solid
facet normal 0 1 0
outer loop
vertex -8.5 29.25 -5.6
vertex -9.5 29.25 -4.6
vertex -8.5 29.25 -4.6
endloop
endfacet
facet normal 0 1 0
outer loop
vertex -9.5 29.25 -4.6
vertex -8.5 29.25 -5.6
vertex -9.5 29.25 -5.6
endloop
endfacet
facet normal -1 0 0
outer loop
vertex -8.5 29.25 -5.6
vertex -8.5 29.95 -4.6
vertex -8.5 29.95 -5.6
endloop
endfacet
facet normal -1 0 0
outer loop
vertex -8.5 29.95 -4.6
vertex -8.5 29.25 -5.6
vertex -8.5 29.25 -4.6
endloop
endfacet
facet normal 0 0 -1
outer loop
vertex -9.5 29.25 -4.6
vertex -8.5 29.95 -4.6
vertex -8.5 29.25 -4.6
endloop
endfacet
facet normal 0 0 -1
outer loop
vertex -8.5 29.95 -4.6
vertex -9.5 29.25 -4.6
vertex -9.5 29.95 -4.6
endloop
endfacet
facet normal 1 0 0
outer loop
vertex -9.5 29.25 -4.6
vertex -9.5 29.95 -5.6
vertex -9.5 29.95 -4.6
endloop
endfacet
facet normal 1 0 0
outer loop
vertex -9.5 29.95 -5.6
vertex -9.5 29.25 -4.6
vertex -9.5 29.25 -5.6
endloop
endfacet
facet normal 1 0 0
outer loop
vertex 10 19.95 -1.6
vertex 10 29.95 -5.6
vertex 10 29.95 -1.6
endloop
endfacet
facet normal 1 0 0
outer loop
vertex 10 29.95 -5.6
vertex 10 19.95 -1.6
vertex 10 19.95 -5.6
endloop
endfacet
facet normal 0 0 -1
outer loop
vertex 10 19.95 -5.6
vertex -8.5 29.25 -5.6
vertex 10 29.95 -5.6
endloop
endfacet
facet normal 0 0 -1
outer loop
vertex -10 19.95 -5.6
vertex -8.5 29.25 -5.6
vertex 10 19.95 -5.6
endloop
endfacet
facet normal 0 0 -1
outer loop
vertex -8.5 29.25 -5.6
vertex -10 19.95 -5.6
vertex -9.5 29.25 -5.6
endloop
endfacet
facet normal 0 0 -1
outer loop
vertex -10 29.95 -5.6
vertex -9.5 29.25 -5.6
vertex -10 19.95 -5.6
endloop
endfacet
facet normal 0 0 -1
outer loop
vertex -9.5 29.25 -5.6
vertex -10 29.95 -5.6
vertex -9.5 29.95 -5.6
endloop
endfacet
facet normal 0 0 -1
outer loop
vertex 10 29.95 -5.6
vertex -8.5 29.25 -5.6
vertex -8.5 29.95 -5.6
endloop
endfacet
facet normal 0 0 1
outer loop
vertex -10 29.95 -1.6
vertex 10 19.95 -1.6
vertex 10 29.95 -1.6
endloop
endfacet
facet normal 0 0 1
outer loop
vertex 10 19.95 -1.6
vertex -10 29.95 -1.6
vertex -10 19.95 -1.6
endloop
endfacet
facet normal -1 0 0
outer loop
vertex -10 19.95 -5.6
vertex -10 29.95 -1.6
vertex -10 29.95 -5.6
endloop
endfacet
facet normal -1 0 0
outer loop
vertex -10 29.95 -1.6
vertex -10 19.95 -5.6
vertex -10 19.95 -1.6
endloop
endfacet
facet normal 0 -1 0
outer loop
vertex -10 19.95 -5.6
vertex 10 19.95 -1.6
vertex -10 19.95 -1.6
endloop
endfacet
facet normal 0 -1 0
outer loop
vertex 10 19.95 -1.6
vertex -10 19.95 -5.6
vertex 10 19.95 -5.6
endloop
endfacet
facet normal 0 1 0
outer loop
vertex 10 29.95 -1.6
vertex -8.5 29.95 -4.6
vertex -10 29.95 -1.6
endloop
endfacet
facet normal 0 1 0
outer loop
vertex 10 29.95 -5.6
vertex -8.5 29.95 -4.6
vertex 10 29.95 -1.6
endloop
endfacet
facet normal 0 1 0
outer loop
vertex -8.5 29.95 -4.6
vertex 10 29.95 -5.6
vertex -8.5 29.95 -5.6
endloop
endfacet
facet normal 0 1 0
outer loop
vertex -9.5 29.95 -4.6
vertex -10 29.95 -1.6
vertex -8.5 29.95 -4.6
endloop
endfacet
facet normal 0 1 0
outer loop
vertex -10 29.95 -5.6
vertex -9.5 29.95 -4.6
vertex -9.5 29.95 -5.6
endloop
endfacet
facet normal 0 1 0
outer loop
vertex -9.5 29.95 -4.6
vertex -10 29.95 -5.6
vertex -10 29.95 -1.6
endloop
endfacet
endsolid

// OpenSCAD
    // MixTape 3d Printed Case///////////////////////////

plugHeight = 9.8; // [6:10]
tapeHeight = 10.0; //
topThickness = 1.6; 

usb_charger = false;
cutout_aux_ports = true;

rotate([180,0,$t*380]) translate([-50,-30,0]){

//PCB();
//parts();

difference(){
    
    FullCase();
    
    // Plugs 
    translate([2.5,50,tapeHeight-plugHeight+topThickness]) cube([13,20,plugHeight+1],false); 
    translate([83.5,50,tapeHeight-plugHeight+topThickness]) cube([13,20,plugHeight+1],false);
    
    // write protectors 
    translate([10,0,0.5*tapeHeight+1.6]) cube([4,1,4],true);
    translate([14,0,0.5*tapeHeight+1.6]) cube([4,3,4],true);
    translate([89,0,0.5*tapeHeight+1.6]) cube([4,1,4],true);
    translate([85,0,0.5*tapeHeight+1.6]) cube([4,3,4],true);

    // Power signs
    if (!usb_charger) {
        translate([41,0,0.5*tapeHeight+1.6]) cube([4,1.5,1],true);
        translate([41,0,0.5*tapeHeight+1.6]) cube([1,1.5,4],true);
    
        translate([58,0,0.5*tapeHeight+1.6]) cube([4,1.5,1],true); 
    }
}
}

module FullCase(){
    tapeBody();
    tapeTop();
}


// Modules ///////////////////////////////

module PCB(){
 color("DarkKhaki") 
    translate ([0,0,tapeHeight+1.6]) linear_extrude(height = 1.6, center = false, convexity = 10, twist = 0) import("mixtape_case_3D_bottom.dxf", convexity=3);
 color("Gold") 
     translate ([0,0,tapeHeight+3.2]) linear_extrude(height = 0.2, center = false, convexity = 10, twist = 0) import("mixtape_case_3D_PCB.dxf", convexity=3);
    
 color("DarkKhaki") 
    translate ([0,0,tapeHeight+2*topThickness]) linear_extrude(height = 1.6, center = false, convexity = 10, twist = 0) import("mixtape_case_3D_PCB_TrapezBoard.dxf", convexity=3);
 color("Gold") 
     translate ([0,0,tapeHeight+3*topThickness]) linear_extrude(height = 0.2, center = false, convexity = 10, twist = 0) import("mixtape_case_3D_PCB_TrapezCircuit.dxf", convexity=3);
}

module tapeBody(){ 
  difference(){ 
    //color("Deeppink") 
    translate ([0,0,1.6]) linear_extrude(height = tapeHeight, center = false, convexity = 10, twist = 0) import("mixtape_case_3D_bottom.dxf", convexity=3);  
    
    translate([11,50,0.7*tapeHeight+topThickness+3]) cube([8,12,0.7*tapeHeight],true);
      
     if (!usb_charger) {
        translate ([0,0,0.6]) linear_extrude(height = 12, center = false, convexity = 10, twist = 0) import("mixtape_case_3D_MainCase.dxf", convexity=3);
     } else {
         translate ([0,0,0.6]) linear_extrude(height = 12, center = false, convexity = 10, twist = 0) import("mixtape_case_3D_MainCase_USB.dxf", convexity=3);
     }
    
    //Face hole
    translate([25,64,0.5*tapeHeight+topThickness]) cube([12,4,0.7*tapeHeight],true);
    if (!usb_charger) { translate([49.5,64,0.5*tapeHeight+topThickness]) cube([16,4,0.7*tapeHeight],true); }
    translate([74.3,64,0.5*tapeHeight+topThickness]) cube([12,4,0.7*tapeHeight],true);
      
    translate([36,65,0.5*tapeHeight+topThickness]) cube([4,4,0.6*tapeHeight],true);
    translate([63,65,0.5*tapeHeight+topThickness]) cube([4,4,0.6*tapeHeight],true);
    
    if (usb_charger) {
        // cutout usb port
        translate([49.5,64,0.5*tapeHeight+topThickness+3]) cube([20,14,0.7*tapeHeight+4],true);
    }
    if (cutout_aux_ports) {
        translate([1.5,23,0.7*tapeHeight+topThickness+3]) cube([20,12,0.7*tapeHeight],true);
        translate([90,23,0.7*tapeHeight+topThickness+3]) cube([20,12,0.7*tapeHeight],true);      
    }
    
  }
  
  
  //color("DarkKhaki") 
  if (!usb_charger) {
    translate([40,0.05,1.6]) cube([20,10,tapeHeight-6],false);
  }
}

module tapeTop(){ 
 
difference(){ 
 color("Deeppink") 
     translate ([0,0,-1.5]) linear_extrude(height = 1.5, center = false, convexity = 10, twist = 0) import("mixtape_case_3D_TopTrapez.dxf", convexity=3);
     
   color("Gold") 
     translate ([0,0,-2.2]) linear_extrude(height = 3, center = false, convexity = 10, twist = 0) import("mixtape_case_3D_Holes.dxf", convexity=3);
   translate([50,53,-2.2]) cylinder(h=1.2, r=1.3, center=false, ,$fn=30);
}   
    

difference(){    
  color("Deeppink") 
     translate ([0,0,0]) linear_extrude(height = 1.6, center = false, convexity = 10, twist = 0) import("mixtape_case_3D_bottom.dxf", convexity=3);

  translate([4,3,-1]) cylinder(h=1.5, r=1.3, center=false, ,$fn=30);
  translate([95,3,-1]) cylinder(h=1.5, r=1.3, center=false, ,$fn=30);
  translate([4,61,-1]) cylinder(h=1.5, r=1.3, center=false, ,$fn=30);
  translate([95,61,-1]) cylinder(h=1.5, r=1.3, center=false, ,$fn=30);
    
  color("Pink") 
     translate ([0,0,-1.3]) linear_extrude(height = 2, center = false, convexity = 10, twist = 0) import("mixtape_case_3D_WindowRect.dxf", convexity=3); 
    
  difference(){    
  color("Gold") 
     translate ([0,0,-0.5]) linear_extrude(height = 1, center = false, convexity = 10, twist = 0) import("mixtape_case_3D_BigRect.dxf", convexity=3);  
  

  translate ([0,0,-3]) linear_extrude(height = 10, center = false, convexity = 10, twist = 0) import("mixtape_case_3D_MidRect.dxf", convexity=3);   
  }
  
  translate ([0,0,-3]) linear_extrude(height = 5.5, center = false, convexity = 10, twist = 0) import("mixtape_case_3D_Wheels.dxf", convexity=3); 
}

  translate ([0,0,0.4]) linear_extrude(height = 1.2, center = false, convexity = 10, twist = 0) import("mixtape_case_3D_NutWheels.dxf", convexity=3); 

}
 

module parts(){
    // IC-Socket
  color("Grey")
      translate([44,22.5,tapeHeight+2*topThickness]) cube([11,13,4],false);
    
  difference(){
  color("Black")
      translate([45,23.5,tapeHeight+2*topThickness]) cube([9,11,7],false);
        
    translate([49.5,34.5,tapeHeight+2*topThickness+6]) cylinder(h=10, r=1.5, center=false, ,$fn=30);
    }
    
    // NEO-Pixels
    for (a = [ 0 : 6.3 : 46 ])
    translate([a,0,0]) NEOpixel();
    
    module NEOpixel(){
    color("White")
      translate([25.2,52.5,tapeHeight+3*topThickness]) cube([5,5,2],false);
        
    color("Deeppink")
      translate([27.7,55,tapeHeight+3*topThickness]) cylinder(h=2.5, r=2, center=false, ,$fn=30);
    }
    
    // Pots
    potentiometer();
    translate ([42,0,0]) potentiometer();
    
    module potentiometer(){
    color("Grey")
      translate([29,29,tapeHeight+2*topThickness]) cylinder(h=10, r=3.5, center=false, ,$fn=30);
    
    color("Deeppink")
        translate([29,29,tapeHeight+2*topThickness+2]) cylinder(h=12, r1=6, r2=4.5, center=false, ,$fn=30);
    }
    
    // Buttons
    button();
    translate ([58,0,0]) button();
    
    module button(){
    color("Grey")
      translate([17.5,9.8,tapeHeight+2*topThickness]) cube([6,6,3],false);
        
    color("Red")
      translate([20.5,12.8,tapeHeight+2*topThickness]) cylinder(h=5, r=1.5, center=false, ,$fn=30);
    }

}
